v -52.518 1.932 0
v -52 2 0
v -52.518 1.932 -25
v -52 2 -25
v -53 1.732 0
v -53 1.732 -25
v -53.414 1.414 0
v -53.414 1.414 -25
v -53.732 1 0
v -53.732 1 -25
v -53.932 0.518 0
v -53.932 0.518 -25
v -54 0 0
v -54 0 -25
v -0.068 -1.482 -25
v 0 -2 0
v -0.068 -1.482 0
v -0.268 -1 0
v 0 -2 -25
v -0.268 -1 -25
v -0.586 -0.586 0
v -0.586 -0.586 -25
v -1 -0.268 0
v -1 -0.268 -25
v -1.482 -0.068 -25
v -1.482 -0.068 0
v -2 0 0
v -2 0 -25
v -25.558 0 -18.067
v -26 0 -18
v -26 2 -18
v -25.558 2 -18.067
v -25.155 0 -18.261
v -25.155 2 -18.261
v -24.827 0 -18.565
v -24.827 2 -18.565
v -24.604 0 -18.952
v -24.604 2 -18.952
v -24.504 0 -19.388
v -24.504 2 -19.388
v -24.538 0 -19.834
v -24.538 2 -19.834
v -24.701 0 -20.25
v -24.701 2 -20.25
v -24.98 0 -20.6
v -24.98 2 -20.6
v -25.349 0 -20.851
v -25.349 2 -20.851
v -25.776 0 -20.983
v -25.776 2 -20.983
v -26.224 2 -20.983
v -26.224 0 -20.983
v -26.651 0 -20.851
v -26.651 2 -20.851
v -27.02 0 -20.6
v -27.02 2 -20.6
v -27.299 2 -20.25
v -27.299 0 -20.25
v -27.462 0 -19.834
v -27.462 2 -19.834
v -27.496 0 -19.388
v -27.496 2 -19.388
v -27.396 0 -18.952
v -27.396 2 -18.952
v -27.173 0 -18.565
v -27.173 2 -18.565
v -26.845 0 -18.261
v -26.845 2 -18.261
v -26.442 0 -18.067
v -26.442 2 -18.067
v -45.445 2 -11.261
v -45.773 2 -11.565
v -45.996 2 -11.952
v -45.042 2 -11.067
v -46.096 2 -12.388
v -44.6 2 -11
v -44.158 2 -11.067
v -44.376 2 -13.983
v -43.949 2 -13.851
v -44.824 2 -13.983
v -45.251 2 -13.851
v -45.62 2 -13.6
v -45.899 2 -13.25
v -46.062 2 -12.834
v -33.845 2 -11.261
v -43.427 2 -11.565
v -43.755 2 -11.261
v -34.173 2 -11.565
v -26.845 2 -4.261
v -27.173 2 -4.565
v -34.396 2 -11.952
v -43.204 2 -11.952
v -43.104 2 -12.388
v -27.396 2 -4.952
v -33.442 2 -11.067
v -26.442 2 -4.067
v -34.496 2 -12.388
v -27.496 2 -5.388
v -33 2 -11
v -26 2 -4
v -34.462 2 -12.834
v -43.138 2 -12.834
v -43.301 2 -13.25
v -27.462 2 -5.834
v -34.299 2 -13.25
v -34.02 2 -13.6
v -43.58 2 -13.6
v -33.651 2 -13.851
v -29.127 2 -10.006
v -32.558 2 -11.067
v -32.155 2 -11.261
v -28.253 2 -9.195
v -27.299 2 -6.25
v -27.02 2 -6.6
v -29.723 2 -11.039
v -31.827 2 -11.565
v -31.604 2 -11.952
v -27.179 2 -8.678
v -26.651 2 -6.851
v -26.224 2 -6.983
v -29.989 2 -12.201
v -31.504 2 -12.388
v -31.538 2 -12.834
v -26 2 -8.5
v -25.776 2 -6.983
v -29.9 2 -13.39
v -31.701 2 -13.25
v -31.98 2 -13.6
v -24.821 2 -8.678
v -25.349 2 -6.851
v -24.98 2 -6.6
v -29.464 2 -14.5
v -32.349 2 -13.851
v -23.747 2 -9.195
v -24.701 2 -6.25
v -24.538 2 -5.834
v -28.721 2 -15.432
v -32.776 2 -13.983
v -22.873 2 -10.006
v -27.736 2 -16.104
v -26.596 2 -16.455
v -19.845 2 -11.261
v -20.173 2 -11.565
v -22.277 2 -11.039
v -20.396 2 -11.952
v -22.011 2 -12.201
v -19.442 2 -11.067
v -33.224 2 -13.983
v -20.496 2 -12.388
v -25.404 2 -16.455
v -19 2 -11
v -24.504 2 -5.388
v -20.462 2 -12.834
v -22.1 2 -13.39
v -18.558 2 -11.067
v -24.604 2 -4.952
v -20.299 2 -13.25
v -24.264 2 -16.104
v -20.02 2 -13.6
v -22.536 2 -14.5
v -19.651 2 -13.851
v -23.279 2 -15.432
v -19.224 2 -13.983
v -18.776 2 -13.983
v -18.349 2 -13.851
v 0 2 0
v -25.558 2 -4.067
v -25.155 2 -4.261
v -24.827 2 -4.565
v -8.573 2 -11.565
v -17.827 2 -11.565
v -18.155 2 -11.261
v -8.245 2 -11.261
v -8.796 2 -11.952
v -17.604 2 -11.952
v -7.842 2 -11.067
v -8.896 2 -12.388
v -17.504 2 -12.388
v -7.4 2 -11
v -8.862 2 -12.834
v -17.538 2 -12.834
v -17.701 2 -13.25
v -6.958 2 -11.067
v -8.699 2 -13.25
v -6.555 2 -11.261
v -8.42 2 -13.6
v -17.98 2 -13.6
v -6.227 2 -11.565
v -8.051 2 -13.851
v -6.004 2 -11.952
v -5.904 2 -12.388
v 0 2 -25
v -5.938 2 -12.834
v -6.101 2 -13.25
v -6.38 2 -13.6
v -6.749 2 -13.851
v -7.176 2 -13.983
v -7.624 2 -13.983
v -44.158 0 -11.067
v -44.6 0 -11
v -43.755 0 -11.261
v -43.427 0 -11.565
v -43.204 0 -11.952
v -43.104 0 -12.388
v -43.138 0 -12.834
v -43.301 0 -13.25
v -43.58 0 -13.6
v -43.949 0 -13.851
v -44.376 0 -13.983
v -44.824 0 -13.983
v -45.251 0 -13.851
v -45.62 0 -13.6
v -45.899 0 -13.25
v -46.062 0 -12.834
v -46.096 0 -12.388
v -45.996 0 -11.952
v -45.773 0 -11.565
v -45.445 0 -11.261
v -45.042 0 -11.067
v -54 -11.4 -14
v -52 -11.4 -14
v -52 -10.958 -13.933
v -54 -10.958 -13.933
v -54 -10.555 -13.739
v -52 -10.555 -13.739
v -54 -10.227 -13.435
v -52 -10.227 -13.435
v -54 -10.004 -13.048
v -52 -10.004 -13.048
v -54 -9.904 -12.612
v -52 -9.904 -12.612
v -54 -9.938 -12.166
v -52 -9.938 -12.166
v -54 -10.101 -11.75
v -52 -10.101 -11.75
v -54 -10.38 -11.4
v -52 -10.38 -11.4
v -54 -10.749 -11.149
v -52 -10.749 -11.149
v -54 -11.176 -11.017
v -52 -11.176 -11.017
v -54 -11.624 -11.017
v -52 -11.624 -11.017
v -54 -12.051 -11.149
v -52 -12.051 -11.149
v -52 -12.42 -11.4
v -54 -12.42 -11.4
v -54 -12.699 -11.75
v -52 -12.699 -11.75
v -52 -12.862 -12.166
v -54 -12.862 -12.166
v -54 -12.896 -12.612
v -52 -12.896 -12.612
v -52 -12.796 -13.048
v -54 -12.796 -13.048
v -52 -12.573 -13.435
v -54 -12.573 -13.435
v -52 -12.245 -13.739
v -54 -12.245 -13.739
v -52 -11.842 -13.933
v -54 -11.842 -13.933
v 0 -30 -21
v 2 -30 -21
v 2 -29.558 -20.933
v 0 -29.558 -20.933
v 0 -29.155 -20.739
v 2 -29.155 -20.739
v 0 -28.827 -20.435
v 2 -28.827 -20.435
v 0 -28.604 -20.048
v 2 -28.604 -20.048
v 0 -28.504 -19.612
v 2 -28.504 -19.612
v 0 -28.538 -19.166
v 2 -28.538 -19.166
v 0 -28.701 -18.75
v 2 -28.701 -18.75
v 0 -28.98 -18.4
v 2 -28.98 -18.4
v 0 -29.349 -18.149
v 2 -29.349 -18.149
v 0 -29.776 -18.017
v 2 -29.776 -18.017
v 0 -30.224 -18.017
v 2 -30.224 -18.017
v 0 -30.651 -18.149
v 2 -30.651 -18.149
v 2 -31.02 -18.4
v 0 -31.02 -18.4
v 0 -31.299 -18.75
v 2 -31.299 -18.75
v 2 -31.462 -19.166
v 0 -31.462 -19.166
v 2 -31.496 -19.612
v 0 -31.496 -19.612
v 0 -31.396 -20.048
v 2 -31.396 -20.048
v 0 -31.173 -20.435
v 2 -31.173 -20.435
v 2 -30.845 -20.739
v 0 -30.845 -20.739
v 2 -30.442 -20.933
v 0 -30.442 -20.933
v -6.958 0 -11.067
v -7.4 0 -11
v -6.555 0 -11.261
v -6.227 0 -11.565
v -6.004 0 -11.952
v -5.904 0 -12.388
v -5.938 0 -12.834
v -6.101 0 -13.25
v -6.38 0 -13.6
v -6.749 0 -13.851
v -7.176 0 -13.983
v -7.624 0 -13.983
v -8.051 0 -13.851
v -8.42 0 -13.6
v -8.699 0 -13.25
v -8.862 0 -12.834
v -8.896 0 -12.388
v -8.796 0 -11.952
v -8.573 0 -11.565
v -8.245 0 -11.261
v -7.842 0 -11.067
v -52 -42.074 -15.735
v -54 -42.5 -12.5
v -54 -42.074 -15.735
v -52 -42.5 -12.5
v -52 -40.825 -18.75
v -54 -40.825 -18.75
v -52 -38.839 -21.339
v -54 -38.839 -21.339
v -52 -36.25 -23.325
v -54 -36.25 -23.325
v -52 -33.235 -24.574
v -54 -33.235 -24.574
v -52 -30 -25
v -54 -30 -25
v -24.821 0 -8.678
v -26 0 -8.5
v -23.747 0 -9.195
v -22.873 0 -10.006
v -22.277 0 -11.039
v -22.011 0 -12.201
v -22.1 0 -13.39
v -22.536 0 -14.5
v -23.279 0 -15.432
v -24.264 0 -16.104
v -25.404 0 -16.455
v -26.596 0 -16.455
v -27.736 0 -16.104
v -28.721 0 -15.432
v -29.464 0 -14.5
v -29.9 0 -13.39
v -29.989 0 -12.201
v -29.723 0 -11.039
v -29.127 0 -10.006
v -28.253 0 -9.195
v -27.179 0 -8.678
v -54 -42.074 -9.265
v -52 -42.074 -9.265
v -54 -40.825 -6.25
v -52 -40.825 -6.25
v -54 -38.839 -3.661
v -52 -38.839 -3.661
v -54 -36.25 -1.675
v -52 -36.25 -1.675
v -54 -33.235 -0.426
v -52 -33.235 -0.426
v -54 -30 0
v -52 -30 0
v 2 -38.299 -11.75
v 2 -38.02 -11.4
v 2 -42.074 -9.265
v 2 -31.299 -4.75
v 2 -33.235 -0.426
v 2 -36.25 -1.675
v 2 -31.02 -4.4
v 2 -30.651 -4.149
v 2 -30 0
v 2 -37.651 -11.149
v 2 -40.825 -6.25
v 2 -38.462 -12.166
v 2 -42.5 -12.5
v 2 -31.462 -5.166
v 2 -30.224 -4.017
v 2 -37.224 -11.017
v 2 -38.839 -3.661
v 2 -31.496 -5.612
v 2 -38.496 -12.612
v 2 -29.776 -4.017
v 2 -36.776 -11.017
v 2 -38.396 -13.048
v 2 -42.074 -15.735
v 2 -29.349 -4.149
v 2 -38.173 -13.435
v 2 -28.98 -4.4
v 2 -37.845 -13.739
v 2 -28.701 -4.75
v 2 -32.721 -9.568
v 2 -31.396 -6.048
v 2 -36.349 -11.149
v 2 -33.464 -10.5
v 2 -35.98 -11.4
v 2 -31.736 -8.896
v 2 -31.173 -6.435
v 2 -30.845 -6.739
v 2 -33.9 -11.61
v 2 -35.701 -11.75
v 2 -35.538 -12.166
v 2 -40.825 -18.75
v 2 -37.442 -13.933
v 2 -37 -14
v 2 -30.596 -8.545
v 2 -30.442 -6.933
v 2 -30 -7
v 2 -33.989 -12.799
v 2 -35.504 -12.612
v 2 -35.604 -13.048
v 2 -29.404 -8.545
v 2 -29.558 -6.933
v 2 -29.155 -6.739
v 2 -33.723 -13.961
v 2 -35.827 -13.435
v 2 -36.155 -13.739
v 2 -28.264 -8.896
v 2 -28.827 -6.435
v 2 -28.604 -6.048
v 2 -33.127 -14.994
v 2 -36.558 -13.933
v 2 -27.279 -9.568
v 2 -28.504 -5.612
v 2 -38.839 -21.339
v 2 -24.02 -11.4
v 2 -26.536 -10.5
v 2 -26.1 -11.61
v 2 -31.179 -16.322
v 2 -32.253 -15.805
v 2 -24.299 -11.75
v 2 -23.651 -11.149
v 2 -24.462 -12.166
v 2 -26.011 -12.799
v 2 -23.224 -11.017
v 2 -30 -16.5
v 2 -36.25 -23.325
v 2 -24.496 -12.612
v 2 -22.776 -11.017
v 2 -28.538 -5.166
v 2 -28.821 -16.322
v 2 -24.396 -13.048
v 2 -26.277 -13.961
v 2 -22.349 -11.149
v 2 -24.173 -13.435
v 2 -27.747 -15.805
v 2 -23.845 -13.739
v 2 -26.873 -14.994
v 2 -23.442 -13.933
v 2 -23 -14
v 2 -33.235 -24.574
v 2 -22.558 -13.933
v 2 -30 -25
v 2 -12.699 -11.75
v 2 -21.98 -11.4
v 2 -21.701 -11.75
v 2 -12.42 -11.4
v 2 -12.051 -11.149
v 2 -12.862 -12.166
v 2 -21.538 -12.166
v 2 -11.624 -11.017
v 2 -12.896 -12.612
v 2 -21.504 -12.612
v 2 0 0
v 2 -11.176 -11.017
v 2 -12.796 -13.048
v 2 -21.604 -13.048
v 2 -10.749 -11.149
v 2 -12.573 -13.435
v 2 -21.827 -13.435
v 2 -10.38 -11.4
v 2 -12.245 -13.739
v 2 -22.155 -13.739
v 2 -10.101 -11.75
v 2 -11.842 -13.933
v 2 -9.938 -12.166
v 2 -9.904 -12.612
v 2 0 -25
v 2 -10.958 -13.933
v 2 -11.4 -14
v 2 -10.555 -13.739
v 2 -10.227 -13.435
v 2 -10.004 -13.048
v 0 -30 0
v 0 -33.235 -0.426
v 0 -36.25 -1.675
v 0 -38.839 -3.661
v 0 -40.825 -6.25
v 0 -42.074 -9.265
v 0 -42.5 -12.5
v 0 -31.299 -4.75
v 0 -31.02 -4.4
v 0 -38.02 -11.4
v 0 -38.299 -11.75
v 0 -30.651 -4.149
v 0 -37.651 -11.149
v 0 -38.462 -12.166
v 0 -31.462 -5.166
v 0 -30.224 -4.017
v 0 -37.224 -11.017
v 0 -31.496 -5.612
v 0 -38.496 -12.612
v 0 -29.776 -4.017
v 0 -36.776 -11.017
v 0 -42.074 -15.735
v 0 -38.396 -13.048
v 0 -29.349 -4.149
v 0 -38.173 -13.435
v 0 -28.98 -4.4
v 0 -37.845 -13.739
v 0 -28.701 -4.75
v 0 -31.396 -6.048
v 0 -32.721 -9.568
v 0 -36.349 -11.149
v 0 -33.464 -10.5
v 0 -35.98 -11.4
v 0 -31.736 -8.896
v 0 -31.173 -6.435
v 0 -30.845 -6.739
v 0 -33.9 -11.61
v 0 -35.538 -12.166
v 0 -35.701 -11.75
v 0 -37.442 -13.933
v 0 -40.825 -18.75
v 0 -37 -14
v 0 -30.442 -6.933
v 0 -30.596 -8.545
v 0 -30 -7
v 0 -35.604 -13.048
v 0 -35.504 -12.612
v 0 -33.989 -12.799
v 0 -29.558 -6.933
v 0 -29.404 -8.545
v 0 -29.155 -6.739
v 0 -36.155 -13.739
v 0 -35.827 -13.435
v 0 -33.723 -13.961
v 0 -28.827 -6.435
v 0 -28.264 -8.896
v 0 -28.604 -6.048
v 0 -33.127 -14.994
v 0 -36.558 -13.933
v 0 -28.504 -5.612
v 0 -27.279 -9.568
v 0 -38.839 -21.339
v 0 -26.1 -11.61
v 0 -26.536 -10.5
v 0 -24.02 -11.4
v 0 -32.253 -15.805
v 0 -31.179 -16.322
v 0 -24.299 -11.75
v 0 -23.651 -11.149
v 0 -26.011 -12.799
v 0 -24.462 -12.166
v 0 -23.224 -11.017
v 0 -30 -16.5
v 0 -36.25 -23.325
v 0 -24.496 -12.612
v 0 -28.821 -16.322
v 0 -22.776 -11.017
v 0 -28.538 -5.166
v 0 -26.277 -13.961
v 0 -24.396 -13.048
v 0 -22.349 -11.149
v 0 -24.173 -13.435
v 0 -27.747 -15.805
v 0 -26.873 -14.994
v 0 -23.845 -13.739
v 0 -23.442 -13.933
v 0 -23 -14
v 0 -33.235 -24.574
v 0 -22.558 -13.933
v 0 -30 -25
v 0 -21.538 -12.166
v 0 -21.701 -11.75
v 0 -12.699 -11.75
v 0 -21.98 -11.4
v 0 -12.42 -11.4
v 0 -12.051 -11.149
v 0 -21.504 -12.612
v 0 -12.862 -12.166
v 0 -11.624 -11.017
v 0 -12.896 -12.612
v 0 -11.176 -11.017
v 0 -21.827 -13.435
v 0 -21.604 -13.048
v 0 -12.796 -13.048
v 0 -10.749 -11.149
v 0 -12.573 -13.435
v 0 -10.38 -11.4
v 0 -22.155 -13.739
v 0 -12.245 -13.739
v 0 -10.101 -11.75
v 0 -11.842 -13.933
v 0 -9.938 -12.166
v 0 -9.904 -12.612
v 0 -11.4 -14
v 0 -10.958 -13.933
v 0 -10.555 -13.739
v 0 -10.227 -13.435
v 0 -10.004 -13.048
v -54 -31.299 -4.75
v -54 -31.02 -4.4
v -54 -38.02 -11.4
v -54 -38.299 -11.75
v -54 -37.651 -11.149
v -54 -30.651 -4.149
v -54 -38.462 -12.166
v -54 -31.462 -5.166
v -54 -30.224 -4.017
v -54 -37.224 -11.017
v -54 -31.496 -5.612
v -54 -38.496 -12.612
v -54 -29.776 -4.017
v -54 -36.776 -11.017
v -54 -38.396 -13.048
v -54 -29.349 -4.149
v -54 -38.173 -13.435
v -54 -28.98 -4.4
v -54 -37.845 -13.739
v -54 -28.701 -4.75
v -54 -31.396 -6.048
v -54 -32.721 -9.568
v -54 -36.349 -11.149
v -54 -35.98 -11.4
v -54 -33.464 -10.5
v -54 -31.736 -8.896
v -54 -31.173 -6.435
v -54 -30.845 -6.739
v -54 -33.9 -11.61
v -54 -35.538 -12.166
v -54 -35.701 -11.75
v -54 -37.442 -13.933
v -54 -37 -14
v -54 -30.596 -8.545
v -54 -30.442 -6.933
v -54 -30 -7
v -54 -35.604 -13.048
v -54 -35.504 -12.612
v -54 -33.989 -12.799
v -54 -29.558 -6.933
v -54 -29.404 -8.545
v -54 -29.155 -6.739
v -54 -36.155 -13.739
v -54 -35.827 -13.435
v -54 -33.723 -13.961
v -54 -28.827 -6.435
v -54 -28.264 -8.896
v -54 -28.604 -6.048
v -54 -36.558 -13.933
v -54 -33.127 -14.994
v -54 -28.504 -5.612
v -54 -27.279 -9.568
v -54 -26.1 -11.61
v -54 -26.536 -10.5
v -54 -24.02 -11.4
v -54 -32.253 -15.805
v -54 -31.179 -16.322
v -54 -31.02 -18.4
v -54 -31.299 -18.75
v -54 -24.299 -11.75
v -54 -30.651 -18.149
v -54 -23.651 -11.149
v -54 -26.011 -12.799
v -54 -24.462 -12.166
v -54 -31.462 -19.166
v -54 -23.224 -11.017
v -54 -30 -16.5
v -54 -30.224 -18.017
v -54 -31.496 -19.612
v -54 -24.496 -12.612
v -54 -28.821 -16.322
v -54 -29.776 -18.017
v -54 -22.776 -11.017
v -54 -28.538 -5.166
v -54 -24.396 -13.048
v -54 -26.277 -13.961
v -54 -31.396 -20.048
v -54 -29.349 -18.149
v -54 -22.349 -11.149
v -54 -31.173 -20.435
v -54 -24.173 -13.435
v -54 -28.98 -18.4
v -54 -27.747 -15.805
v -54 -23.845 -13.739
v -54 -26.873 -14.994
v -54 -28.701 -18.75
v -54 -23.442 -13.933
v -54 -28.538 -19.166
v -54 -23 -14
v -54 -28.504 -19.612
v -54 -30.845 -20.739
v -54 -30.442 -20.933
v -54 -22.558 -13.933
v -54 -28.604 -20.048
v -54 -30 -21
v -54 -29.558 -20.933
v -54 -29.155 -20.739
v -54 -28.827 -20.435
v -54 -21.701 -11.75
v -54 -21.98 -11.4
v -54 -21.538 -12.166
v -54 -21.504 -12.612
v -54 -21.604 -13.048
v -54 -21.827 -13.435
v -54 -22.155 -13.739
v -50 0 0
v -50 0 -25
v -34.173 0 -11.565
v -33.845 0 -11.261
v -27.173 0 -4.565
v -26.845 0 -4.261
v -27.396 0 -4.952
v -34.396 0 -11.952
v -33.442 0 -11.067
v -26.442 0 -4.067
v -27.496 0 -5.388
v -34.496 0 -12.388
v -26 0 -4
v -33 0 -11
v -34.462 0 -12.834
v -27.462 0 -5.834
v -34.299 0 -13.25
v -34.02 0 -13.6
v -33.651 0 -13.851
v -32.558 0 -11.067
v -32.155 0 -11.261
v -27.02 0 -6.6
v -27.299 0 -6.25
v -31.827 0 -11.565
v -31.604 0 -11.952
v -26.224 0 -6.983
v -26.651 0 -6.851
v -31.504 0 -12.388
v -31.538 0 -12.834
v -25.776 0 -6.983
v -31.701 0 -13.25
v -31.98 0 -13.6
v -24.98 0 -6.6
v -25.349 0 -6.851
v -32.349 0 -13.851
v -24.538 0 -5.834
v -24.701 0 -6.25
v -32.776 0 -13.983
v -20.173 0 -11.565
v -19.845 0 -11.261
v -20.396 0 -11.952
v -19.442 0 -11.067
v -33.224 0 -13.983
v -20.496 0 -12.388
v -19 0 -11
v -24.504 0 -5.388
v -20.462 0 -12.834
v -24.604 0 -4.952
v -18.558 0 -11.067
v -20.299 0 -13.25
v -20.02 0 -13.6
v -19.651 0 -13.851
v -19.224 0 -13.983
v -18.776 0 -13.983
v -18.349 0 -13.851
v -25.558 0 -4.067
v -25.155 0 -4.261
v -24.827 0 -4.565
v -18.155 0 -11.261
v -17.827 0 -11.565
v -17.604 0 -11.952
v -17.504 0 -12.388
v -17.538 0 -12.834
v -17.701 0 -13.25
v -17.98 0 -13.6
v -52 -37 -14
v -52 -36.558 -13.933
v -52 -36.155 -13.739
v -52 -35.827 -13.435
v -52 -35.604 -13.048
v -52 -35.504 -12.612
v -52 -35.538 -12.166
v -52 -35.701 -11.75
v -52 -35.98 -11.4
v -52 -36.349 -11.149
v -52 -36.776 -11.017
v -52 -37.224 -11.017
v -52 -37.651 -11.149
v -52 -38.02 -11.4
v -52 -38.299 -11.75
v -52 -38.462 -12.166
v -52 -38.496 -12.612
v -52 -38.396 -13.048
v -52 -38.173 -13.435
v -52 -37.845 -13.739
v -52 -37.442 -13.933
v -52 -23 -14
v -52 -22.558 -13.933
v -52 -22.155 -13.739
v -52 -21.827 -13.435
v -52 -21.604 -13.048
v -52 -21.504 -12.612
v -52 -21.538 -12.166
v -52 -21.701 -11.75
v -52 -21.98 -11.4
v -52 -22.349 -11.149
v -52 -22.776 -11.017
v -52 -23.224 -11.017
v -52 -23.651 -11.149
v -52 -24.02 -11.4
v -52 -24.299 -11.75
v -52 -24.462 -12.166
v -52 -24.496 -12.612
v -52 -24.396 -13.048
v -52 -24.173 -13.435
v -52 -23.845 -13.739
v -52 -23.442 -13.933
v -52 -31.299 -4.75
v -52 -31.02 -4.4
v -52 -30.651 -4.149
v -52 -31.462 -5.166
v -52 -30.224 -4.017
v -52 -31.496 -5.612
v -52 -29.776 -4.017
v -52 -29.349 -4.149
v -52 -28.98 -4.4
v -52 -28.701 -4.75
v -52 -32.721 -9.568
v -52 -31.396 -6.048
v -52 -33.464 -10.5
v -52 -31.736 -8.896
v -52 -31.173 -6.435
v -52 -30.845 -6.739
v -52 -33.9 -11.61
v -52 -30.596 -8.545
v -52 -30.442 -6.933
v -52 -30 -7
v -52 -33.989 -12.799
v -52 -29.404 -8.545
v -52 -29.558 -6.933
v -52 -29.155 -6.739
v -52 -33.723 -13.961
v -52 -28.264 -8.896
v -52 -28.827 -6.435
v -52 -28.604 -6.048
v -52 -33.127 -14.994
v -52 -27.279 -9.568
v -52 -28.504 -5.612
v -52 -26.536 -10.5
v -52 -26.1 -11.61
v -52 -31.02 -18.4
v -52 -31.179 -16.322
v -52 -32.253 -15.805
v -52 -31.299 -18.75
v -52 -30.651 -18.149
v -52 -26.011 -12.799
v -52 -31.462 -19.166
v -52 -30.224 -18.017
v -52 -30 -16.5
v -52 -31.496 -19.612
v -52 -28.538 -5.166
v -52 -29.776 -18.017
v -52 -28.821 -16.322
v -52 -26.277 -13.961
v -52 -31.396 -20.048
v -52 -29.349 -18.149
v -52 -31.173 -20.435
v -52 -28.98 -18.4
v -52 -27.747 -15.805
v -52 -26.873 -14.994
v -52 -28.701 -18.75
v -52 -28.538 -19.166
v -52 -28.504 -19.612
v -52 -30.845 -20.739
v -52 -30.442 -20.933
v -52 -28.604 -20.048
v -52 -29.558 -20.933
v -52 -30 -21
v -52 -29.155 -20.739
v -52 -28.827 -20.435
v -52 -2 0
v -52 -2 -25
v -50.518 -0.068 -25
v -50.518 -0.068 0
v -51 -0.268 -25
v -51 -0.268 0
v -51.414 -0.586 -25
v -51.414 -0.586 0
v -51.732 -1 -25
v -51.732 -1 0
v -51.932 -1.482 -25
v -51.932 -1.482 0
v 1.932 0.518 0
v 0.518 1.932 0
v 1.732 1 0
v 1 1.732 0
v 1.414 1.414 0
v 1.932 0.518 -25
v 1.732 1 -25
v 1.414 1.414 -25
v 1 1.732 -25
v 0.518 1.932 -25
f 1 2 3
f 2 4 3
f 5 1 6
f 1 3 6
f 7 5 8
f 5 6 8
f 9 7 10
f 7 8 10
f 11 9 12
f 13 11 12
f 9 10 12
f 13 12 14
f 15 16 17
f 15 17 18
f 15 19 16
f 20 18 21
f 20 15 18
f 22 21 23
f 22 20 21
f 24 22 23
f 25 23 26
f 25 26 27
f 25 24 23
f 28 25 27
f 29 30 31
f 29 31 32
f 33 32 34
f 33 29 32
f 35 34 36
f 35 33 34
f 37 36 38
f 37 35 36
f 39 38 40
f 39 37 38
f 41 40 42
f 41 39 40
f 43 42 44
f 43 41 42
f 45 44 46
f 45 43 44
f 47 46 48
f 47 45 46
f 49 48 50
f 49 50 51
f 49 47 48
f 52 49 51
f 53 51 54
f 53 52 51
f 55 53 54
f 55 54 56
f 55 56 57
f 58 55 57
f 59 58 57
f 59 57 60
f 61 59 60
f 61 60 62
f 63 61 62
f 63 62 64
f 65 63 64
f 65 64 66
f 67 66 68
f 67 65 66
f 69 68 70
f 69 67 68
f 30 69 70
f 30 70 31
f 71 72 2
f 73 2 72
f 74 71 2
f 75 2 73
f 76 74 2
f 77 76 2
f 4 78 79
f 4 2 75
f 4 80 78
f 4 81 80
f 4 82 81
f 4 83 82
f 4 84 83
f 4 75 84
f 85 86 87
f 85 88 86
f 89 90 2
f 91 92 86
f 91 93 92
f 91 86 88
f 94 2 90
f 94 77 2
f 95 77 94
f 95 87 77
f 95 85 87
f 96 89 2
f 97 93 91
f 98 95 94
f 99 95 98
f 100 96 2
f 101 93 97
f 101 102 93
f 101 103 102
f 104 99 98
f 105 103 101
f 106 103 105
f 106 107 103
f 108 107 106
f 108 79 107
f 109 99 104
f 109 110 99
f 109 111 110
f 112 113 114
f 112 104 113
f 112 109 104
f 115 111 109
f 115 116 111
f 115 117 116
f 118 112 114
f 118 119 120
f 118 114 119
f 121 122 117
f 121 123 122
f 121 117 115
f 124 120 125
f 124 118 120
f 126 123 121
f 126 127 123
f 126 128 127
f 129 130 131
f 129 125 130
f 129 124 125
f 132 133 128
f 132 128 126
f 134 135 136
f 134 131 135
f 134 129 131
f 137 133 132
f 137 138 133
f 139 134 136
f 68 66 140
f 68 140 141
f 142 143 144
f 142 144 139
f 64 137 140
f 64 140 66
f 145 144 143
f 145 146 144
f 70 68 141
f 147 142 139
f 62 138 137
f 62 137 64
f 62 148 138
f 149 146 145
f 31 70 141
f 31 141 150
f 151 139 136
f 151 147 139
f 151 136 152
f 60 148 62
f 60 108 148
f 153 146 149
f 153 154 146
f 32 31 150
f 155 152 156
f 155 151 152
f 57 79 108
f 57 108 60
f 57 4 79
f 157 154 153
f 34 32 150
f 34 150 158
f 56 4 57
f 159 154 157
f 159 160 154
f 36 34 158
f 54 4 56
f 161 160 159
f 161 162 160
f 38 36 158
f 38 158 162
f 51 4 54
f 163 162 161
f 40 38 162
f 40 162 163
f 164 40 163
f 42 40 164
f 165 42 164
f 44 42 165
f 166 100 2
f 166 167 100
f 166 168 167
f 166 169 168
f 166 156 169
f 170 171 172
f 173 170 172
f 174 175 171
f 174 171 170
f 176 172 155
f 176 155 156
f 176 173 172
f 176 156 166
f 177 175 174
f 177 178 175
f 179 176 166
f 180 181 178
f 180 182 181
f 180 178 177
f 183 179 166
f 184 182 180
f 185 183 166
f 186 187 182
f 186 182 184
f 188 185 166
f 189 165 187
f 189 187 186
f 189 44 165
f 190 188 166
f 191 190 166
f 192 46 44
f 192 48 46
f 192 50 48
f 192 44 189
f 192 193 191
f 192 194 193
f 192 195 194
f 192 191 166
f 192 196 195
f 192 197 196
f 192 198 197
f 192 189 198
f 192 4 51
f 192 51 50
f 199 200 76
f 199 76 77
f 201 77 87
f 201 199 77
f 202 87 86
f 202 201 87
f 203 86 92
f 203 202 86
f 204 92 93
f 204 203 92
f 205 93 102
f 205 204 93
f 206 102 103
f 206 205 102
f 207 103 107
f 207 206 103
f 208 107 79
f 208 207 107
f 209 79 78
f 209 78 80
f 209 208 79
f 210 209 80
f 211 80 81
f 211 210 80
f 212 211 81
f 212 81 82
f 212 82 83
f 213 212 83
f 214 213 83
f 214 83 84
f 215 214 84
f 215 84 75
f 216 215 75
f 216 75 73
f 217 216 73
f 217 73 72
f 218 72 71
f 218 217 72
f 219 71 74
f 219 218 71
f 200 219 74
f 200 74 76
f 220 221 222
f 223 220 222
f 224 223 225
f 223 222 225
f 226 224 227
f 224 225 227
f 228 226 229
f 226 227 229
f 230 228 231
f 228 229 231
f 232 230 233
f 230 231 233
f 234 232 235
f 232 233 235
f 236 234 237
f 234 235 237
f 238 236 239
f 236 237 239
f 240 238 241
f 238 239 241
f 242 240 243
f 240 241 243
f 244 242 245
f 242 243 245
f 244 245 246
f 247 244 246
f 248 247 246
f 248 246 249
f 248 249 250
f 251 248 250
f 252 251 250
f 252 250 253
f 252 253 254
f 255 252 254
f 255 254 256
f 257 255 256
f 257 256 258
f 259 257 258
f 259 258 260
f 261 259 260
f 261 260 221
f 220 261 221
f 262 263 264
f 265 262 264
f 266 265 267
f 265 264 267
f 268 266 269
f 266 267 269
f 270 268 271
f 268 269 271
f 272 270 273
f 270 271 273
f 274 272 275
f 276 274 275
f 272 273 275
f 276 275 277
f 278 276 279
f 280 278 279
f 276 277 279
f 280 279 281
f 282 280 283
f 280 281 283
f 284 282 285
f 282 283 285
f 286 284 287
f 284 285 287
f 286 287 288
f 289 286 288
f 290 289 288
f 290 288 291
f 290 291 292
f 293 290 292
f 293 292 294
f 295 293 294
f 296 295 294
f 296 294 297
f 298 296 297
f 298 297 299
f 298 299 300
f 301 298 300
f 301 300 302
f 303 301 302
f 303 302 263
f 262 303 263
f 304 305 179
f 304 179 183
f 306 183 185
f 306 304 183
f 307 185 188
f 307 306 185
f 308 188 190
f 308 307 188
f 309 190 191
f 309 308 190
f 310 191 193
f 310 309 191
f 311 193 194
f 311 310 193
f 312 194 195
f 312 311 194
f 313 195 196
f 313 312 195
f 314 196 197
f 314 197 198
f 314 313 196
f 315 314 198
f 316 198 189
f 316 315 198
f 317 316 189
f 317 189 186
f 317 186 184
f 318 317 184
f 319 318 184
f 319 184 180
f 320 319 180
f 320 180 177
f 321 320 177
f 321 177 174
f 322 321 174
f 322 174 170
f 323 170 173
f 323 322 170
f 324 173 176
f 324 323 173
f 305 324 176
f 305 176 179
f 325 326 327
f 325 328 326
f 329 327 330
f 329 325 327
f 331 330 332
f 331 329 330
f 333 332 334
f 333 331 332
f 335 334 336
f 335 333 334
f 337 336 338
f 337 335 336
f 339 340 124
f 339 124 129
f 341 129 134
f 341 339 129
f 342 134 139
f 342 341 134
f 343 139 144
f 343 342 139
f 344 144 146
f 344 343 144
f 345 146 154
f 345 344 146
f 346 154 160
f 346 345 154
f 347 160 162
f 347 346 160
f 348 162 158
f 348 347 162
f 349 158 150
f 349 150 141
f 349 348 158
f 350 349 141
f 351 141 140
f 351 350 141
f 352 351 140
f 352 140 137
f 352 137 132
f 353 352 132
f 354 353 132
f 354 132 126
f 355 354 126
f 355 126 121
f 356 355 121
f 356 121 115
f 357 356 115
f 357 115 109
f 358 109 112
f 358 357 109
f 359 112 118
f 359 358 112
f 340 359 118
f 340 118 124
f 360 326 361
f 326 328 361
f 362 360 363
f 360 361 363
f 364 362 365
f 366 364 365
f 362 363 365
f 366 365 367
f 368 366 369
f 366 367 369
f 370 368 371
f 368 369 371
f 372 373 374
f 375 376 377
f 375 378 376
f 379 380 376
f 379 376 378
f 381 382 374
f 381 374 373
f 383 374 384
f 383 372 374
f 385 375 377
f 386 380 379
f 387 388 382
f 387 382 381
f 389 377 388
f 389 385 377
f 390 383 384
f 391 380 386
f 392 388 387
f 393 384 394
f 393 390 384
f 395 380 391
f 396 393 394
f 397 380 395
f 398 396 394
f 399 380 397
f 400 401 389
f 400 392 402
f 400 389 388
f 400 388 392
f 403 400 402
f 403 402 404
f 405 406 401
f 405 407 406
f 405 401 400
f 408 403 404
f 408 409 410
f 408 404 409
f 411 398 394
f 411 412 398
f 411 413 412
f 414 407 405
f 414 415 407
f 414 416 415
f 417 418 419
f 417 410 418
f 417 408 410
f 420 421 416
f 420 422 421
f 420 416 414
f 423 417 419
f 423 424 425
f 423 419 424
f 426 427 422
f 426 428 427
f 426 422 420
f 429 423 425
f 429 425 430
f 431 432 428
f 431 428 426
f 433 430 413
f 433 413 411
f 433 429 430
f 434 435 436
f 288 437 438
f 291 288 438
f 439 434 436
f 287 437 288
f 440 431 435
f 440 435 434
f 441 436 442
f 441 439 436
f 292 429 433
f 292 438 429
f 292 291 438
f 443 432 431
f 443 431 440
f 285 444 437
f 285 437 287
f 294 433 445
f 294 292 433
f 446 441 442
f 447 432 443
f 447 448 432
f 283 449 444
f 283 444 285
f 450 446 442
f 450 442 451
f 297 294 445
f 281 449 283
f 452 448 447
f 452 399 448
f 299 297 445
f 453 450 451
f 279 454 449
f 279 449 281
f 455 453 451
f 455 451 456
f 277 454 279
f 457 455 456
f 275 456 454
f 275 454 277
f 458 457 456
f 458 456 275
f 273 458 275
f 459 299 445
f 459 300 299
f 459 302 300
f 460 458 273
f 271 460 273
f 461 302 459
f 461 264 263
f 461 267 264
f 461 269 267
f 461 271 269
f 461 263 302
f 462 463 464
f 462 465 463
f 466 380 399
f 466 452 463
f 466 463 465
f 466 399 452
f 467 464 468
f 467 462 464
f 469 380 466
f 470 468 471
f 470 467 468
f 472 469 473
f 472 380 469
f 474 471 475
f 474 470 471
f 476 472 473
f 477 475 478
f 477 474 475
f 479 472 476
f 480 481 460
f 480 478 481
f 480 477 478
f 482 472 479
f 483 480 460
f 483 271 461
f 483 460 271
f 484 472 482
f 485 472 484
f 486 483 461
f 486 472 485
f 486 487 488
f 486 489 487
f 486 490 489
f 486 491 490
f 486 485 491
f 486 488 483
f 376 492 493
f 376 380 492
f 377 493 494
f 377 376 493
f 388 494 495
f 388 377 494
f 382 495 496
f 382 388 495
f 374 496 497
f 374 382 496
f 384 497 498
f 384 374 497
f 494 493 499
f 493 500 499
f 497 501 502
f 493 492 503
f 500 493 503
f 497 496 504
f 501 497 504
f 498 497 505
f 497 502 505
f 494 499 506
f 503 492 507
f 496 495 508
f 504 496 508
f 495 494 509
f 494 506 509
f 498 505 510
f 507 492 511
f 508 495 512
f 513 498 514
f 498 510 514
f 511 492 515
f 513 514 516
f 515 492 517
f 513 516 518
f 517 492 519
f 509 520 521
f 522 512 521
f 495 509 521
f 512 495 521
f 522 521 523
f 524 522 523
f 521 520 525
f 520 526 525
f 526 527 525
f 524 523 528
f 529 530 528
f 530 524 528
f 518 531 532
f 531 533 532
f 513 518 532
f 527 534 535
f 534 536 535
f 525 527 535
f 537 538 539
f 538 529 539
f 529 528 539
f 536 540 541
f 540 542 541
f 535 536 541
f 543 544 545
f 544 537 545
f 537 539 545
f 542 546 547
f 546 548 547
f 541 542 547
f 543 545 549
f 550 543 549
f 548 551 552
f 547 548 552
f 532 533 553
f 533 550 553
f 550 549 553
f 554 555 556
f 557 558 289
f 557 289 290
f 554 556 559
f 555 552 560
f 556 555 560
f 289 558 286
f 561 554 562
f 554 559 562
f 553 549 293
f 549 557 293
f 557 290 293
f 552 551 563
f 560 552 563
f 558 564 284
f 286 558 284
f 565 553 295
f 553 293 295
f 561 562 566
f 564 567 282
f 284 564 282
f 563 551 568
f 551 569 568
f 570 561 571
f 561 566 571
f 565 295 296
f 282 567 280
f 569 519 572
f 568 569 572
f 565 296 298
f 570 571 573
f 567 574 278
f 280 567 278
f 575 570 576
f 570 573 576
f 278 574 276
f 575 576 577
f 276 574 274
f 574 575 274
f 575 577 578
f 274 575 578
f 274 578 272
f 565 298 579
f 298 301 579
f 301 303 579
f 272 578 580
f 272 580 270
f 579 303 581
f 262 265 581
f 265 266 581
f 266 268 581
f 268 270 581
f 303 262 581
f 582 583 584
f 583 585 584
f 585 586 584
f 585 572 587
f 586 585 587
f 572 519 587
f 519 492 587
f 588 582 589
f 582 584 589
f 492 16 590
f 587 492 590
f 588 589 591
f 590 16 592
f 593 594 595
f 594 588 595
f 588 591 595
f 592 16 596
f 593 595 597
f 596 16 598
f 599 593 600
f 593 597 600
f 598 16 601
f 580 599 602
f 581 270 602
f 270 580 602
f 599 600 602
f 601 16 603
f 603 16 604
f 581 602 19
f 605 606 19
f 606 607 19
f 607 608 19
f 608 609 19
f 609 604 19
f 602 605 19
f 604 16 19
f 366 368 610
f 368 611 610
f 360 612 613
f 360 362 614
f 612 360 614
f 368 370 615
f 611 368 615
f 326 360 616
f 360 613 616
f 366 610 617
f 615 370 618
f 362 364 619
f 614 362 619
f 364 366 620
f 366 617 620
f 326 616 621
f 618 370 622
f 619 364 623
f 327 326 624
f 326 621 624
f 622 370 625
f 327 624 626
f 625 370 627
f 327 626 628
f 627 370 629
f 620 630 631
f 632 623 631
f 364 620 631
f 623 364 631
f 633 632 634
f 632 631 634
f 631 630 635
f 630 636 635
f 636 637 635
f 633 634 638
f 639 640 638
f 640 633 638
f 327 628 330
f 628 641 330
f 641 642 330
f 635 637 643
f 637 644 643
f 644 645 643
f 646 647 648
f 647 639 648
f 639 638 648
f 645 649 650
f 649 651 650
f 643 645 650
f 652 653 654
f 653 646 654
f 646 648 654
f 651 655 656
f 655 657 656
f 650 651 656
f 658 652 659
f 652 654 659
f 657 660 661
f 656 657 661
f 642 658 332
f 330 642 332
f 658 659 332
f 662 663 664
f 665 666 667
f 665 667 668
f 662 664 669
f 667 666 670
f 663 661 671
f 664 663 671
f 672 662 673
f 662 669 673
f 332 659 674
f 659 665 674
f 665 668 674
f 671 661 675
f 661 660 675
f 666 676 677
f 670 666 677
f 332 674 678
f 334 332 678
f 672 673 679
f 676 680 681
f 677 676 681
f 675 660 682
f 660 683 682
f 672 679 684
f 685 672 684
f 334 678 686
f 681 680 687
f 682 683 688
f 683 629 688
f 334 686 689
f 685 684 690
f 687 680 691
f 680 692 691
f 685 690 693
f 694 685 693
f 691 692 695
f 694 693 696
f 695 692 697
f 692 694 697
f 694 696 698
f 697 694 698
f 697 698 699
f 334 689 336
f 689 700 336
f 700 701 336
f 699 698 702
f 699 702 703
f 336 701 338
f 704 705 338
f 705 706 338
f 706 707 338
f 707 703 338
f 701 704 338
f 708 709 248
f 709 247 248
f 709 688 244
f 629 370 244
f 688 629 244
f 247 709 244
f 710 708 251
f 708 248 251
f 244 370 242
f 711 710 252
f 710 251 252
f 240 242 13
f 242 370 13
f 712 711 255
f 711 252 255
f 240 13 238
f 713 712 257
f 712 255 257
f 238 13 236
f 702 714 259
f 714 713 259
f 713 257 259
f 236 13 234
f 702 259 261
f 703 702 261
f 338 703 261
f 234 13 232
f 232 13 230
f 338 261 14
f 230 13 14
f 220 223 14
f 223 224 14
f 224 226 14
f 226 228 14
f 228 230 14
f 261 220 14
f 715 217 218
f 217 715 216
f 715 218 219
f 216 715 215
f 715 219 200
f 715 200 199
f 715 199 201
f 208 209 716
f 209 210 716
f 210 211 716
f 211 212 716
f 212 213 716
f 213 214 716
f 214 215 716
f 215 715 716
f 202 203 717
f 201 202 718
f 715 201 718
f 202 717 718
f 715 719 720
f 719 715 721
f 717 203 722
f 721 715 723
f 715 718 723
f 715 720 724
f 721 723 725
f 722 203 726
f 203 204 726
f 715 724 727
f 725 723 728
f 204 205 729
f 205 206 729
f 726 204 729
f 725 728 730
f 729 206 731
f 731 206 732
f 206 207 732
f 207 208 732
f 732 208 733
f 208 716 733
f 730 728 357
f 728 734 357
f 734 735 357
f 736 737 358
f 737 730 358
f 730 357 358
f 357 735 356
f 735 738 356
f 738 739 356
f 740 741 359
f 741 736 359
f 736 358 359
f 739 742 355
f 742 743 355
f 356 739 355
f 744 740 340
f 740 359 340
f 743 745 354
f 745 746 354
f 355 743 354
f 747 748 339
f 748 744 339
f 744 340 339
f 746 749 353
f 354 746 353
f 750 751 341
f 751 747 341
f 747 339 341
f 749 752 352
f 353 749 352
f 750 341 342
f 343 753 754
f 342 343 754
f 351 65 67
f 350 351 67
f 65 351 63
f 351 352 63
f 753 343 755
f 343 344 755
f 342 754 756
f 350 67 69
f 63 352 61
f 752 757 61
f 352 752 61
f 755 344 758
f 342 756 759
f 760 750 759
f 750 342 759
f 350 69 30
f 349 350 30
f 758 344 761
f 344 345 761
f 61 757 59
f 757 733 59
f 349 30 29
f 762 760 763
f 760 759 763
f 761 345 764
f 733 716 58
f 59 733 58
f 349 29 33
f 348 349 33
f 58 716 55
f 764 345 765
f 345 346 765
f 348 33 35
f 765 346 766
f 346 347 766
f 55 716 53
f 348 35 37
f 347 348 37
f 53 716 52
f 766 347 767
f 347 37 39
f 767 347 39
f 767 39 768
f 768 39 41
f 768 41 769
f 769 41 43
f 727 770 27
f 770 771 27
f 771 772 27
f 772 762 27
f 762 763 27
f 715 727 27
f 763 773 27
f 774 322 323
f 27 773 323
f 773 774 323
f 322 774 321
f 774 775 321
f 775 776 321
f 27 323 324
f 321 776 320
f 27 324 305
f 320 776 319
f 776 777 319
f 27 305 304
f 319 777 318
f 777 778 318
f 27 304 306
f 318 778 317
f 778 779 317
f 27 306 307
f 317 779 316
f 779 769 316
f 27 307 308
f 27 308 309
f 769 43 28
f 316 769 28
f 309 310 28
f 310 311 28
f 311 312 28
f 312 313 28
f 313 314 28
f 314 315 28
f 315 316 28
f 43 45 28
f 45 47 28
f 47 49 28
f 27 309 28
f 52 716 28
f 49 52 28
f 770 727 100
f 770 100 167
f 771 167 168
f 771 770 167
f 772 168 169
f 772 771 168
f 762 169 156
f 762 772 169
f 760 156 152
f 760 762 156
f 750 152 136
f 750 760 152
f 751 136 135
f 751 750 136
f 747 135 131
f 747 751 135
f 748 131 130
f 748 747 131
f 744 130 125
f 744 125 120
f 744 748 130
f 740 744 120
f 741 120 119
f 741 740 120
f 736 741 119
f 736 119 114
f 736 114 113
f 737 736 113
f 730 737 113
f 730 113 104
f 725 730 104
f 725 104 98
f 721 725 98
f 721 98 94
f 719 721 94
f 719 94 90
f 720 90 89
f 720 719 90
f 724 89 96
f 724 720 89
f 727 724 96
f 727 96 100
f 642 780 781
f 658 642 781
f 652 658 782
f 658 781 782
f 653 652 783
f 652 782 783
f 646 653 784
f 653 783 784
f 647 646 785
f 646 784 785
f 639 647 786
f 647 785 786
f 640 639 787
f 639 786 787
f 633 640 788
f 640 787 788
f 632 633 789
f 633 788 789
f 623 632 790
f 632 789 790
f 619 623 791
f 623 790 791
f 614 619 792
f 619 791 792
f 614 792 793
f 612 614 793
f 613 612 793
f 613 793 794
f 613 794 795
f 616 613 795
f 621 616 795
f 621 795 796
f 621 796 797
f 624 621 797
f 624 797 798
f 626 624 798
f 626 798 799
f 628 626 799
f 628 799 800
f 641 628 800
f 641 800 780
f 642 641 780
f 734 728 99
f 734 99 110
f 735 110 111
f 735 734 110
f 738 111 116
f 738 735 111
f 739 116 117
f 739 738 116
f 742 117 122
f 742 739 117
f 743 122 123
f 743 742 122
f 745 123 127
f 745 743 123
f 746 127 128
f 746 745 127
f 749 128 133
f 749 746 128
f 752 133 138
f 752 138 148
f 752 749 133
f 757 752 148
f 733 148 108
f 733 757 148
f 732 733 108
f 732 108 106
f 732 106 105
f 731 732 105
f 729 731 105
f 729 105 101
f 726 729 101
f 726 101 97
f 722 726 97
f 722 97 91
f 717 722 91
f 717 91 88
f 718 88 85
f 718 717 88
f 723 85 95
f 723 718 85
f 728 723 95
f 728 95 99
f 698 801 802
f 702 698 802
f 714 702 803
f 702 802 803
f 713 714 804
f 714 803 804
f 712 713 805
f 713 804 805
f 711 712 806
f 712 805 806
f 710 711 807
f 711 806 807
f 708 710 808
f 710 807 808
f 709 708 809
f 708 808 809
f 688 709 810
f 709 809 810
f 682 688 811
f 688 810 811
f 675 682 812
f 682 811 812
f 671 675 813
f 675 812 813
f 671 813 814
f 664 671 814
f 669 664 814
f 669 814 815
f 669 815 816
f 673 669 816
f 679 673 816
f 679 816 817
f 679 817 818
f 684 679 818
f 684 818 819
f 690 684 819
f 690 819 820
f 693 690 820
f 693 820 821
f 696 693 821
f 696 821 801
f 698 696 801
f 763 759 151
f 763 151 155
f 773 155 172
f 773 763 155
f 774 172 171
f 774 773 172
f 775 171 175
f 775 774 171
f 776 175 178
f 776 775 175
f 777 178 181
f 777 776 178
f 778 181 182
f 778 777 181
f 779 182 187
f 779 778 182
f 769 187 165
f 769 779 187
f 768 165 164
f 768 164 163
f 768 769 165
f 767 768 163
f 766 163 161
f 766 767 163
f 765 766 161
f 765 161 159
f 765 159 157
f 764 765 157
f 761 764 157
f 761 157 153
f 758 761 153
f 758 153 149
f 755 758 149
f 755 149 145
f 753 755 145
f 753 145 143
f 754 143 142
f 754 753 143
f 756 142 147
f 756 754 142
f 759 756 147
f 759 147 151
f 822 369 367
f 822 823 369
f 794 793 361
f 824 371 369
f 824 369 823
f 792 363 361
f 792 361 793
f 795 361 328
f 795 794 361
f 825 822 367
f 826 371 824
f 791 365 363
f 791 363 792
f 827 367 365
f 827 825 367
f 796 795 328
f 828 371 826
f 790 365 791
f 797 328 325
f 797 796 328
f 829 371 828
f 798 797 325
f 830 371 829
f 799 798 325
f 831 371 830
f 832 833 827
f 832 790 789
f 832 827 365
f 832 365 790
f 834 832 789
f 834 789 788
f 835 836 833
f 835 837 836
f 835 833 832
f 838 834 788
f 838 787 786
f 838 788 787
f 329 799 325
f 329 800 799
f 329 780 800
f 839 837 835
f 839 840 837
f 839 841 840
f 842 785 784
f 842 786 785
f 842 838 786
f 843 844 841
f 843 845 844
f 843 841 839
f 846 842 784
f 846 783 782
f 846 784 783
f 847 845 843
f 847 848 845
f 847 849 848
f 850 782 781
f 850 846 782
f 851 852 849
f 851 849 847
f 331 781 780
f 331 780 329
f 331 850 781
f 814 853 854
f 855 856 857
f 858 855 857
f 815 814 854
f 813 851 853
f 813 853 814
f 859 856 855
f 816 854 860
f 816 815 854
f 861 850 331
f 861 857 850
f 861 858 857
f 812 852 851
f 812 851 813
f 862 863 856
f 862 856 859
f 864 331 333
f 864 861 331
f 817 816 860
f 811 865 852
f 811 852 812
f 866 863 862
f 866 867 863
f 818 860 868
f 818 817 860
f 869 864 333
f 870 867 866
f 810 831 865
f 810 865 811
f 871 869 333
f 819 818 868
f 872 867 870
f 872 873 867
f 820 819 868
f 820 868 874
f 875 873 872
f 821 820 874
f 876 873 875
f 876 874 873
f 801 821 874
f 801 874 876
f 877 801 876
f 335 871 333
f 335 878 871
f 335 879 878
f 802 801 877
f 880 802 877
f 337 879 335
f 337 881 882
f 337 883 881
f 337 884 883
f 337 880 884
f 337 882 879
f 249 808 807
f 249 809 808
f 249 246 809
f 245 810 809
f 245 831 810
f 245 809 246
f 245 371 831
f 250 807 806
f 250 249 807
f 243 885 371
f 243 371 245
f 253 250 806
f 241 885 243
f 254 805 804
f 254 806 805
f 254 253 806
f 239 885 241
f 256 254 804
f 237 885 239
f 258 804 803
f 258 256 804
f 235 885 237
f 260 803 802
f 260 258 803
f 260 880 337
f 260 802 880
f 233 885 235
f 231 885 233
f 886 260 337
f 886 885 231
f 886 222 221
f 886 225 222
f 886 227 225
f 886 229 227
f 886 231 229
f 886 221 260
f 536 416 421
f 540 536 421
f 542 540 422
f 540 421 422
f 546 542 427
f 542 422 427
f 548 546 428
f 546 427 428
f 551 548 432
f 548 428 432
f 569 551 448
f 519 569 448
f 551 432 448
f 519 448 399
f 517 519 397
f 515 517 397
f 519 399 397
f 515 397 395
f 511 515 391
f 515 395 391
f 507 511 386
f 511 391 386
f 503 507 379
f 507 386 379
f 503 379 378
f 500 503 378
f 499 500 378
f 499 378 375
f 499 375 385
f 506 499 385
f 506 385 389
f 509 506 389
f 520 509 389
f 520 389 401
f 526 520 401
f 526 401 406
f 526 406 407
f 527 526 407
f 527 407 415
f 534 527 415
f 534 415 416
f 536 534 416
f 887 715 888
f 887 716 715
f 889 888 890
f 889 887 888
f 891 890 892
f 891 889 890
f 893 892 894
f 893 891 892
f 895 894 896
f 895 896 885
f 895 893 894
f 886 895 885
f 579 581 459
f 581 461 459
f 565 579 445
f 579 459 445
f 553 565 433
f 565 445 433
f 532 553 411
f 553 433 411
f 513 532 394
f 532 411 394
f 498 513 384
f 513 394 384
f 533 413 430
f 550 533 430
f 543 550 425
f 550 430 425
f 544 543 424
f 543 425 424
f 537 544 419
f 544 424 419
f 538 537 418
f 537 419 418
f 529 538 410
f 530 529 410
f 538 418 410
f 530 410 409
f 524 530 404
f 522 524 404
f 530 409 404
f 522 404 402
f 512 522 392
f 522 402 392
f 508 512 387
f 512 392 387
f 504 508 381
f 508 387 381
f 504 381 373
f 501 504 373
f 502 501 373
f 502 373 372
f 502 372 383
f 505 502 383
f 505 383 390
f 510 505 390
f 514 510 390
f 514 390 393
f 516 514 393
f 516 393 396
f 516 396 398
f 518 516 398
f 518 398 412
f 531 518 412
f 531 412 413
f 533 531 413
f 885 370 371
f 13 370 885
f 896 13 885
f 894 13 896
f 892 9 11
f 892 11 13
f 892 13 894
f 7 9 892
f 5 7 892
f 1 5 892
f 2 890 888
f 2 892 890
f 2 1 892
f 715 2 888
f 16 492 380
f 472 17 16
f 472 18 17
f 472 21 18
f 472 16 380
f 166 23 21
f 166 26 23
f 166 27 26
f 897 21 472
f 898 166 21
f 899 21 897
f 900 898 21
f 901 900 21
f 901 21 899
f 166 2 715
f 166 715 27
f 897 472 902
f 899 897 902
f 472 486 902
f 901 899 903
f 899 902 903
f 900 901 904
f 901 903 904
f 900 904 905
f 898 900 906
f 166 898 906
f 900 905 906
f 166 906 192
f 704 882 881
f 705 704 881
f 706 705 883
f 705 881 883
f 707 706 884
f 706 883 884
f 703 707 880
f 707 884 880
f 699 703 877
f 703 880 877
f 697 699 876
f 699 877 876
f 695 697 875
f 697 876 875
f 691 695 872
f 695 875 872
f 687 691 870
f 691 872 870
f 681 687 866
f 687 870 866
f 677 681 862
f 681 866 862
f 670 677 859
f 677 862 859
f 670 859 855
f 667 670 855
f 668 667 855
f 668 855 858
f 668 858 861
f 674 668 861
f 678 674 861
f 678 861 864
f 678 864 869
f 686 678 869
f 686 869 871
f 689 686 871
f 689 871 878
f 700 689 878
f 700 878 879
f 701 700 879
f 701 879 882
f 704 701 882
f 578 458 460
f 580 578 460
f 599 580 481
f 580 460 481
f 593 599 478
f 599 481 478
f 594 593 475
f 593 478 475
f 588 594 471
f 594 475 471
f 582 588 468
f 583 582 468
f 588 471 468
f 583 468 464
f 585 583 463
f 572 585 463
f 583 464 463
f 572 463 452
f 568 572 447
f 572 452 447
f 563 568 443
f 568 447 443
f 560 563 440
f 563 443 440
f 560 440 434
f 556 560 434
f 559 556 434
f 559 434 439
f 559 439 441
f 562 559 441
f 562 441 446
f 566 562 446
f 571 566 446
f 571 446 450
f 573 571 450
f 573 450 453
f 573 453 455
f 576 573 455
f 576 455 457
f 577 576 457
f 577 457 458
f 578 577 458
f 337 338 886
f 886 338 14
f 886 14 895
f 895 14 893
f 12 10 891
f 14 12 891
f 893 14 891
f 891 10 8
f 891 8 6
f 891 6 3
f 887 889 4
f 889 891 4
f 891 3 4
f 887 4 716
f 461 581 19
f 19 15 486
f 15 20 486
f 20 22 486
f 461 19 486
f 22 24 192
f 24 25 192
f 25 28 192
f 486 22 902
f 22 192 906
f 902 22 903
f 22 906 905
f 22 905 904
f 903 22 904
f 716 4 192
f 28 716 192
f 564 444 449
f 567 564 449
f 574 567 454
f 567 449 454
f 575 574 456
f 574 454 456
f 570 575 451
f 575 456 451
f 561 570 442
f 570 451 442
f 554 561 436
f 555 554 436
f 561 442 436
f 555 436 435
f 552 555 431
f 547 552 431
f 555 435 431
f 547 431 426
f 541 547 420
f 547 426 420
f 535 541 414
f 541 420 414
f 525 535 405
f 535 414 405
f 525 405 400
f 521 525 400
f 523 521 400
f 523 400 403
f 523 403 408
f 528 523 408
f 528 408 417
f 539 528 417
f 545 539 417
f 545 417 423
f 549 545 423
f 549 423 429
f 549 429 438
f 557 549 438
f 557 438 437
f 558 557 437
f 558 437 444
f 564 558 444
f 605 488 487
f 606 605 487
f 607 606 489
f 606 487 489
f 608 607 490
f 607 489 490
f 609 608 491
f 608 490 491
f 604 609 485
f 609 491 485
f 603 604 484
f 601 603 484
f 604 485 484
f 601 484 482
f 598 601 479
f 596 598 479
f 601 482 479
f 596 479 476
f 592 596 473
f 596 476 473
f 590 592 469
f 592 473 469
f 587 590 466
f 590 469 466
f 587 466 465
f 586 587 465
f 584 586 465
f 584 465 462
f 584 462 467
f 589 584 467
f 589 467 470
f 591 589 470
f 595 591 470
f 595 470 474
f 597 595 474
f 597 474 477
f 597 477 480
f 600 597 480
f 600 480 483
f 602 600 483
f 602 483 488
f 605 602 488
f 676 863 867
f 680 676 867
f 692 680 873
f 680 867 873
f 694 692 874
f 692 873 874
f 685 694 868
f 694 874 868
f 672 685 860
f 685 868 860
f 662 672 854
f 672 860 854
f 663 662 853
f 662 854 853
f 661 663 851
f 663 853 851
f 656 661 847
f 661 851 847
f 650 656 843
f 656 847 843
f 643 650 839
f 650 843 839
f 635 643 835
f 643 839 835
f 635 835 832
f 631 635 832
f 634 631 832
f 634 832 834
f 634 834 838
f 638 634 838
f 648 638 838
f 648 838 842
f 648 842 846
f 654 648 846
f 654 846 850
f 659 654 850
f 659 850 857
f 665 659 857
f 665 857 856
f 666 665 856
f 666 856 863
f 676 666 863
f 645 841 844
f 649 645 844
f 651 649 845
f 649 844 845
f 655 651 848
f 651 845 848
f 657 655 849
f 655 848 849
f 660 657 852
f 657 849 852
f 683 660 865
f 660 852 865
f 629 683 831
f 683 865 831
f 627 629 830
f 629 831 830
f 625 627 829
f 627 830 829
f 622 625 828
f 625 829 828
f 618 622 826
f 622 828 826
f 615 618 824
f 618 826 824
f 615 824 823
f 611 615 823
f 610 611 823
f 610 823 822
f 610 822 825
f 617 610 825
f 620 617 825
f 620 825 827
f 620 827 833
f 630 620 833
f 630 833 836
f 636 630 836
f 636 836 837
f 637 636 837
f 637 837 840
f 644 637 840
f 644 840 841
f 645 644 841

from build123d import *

# Parameters (mm, degrees)
SKETCH_1_W          = 52
SKETCH_1_H          = 25
SKETCH_1_R          = 4
SKETCH_1_R_2        = 1.5
EXTRUDE_1_DEPTH     = 2
SKETCH_2_W          = 2
SKETCH_2_H          = 25
EXTRUDE_2_DEPTH     = 44.5
FILLET_1_R          = 12.5
FILLET_2_R          = 12.5
SKETCH_3_R          = 4
SKETCH_3_R_2        = 1.5
CUT_EXTRUDE_1_DEPTH = 64.5
FILLET_5_R          = 2


with BuildPart() as part:
    # 草图1 → 凸台-拉伸1 (new body)
    with BuildSketch(Plane(origin=(0, 0, 0), x_dir=(1, 0, 0), z_dir=(0, 1, 0))):
        with Locations((-26, 12.5)):
            Rectangle(SKETCH_1_W, SKETCH_1_H)
        with Locations(Location((-26, 12.5, 0), (0, 0, 270))):
            Circle(SKETCH_1_R, mode=Mode.SUBTRACT)
        with Locations(Location((-26, 5.5, 0), (0, 0, 270))):
            Circle(SKETCH_1_R_2, mode=Mode.SUBTRACT)
        with Locations(Location((-33, 12.5, 0), (0, 0, 270))):
            Circle(SKETCH_1_R_2, mode=Mode.SUBTRACT)
        with Locations(Location((-26, 19.5, 0), (0, 0, 270))):
            Circle(SKETCH_1_R_2, mode=Mode.SUBTRACT)
        with Locations(Location((-19, 12.5, 0), (0, 0, 270))):
            Circle(SKETCH_1_R_2, mode=Mode.SUBTRACT)
        with Locations(Location((-7.4, 12.5, 0), (0, 0, 270))):
            Circle(SKETCH_1_R_2, mode=Mode.SUBTRACT)
        with Locations(Location((-44.6, 12.5, 0), (0, 0, 270))):
            Circle(SKETCH_1_R_2, mode=Mode.SUBTRACT)
    extrude(amount=EXTRUDE_1_DEPTH)

    # 草图2 → 凸台-拉伸2 (add)
    with BuildSketch(Plane(origin=(0, 2, 0), x_dir=(1, 0, 0), z_dir=(0, 1, 0))):
        with Locations((-53, 12.5)):
            Rectangle(SKETCH_2_W, SKETCH_2_H)
        with Locations((1, 12.5)):
            Rectangle(SKETCH_2_W, SKETCH_2_H)
    extrude(amount=-EXTRUDE_2_DEPTH)

    # 圆角1
    fillet_1_edges = [part.edges().sort_by_distance(p)[0] for p in [
        (-53, -42.5, -25),
        (-53, -42.5, 0),
    ]]
    fillet(fillet_1_edges, radius=FILLET_1_R - 0.0001)  # a hair under: the kernel refuses the full size

    # 圆角2
    fillet_2_edges = [part.edges().sort_by_distance(p)[0] for p in [
        (1, -42.5, -25),
        (1, -42.5, 0),
    ]]
    fillet(fillet_2_edges, radius=FILLET_2_R - 0.0001)  # a hair under: the kernel refuses the full size

    # 草图3 → 切除-拉伸1 (cut)
    with BuildSketch(Plane(origin=(2, 0, 0), x_dir=(0, 0, -1), z_dir=(1, 0, 0))):
        with Locations((12.5, -30)):
            Circle(SKETCH_3_R)
        with Locations((12.5, -23)):
            Circle(SKETCH_3_R_2)
        with Locations((19.5, -30)):
            Circle(SKETCH_3_R_2)
        with Locations((12.5, -37)):
            Circle(SKETCH_3_R_2)
        with Locations((5.5, -30)):
            Circle(SKETCH_3_R_2)
        with Locations((12.5, -11.4)):
            Circle(SKETCH_3_R_2)
    extrude(amount=-CUT_EXTRUDE_1_DEPTH, mode=Mode.SUBTRACT)

    # 圆角5
    fillet_5_edges = [part.edges().sort_by_distance(p)[0] for p in [
        (-54, 2, -12.5),
        (-52, 0, -12.5),
        (2, 2, -12.5),
        (0, 0, -12.5),
    ]]
    fillet(fillet_5_edges, radius=FILLET_5_R)


solid = part.part
